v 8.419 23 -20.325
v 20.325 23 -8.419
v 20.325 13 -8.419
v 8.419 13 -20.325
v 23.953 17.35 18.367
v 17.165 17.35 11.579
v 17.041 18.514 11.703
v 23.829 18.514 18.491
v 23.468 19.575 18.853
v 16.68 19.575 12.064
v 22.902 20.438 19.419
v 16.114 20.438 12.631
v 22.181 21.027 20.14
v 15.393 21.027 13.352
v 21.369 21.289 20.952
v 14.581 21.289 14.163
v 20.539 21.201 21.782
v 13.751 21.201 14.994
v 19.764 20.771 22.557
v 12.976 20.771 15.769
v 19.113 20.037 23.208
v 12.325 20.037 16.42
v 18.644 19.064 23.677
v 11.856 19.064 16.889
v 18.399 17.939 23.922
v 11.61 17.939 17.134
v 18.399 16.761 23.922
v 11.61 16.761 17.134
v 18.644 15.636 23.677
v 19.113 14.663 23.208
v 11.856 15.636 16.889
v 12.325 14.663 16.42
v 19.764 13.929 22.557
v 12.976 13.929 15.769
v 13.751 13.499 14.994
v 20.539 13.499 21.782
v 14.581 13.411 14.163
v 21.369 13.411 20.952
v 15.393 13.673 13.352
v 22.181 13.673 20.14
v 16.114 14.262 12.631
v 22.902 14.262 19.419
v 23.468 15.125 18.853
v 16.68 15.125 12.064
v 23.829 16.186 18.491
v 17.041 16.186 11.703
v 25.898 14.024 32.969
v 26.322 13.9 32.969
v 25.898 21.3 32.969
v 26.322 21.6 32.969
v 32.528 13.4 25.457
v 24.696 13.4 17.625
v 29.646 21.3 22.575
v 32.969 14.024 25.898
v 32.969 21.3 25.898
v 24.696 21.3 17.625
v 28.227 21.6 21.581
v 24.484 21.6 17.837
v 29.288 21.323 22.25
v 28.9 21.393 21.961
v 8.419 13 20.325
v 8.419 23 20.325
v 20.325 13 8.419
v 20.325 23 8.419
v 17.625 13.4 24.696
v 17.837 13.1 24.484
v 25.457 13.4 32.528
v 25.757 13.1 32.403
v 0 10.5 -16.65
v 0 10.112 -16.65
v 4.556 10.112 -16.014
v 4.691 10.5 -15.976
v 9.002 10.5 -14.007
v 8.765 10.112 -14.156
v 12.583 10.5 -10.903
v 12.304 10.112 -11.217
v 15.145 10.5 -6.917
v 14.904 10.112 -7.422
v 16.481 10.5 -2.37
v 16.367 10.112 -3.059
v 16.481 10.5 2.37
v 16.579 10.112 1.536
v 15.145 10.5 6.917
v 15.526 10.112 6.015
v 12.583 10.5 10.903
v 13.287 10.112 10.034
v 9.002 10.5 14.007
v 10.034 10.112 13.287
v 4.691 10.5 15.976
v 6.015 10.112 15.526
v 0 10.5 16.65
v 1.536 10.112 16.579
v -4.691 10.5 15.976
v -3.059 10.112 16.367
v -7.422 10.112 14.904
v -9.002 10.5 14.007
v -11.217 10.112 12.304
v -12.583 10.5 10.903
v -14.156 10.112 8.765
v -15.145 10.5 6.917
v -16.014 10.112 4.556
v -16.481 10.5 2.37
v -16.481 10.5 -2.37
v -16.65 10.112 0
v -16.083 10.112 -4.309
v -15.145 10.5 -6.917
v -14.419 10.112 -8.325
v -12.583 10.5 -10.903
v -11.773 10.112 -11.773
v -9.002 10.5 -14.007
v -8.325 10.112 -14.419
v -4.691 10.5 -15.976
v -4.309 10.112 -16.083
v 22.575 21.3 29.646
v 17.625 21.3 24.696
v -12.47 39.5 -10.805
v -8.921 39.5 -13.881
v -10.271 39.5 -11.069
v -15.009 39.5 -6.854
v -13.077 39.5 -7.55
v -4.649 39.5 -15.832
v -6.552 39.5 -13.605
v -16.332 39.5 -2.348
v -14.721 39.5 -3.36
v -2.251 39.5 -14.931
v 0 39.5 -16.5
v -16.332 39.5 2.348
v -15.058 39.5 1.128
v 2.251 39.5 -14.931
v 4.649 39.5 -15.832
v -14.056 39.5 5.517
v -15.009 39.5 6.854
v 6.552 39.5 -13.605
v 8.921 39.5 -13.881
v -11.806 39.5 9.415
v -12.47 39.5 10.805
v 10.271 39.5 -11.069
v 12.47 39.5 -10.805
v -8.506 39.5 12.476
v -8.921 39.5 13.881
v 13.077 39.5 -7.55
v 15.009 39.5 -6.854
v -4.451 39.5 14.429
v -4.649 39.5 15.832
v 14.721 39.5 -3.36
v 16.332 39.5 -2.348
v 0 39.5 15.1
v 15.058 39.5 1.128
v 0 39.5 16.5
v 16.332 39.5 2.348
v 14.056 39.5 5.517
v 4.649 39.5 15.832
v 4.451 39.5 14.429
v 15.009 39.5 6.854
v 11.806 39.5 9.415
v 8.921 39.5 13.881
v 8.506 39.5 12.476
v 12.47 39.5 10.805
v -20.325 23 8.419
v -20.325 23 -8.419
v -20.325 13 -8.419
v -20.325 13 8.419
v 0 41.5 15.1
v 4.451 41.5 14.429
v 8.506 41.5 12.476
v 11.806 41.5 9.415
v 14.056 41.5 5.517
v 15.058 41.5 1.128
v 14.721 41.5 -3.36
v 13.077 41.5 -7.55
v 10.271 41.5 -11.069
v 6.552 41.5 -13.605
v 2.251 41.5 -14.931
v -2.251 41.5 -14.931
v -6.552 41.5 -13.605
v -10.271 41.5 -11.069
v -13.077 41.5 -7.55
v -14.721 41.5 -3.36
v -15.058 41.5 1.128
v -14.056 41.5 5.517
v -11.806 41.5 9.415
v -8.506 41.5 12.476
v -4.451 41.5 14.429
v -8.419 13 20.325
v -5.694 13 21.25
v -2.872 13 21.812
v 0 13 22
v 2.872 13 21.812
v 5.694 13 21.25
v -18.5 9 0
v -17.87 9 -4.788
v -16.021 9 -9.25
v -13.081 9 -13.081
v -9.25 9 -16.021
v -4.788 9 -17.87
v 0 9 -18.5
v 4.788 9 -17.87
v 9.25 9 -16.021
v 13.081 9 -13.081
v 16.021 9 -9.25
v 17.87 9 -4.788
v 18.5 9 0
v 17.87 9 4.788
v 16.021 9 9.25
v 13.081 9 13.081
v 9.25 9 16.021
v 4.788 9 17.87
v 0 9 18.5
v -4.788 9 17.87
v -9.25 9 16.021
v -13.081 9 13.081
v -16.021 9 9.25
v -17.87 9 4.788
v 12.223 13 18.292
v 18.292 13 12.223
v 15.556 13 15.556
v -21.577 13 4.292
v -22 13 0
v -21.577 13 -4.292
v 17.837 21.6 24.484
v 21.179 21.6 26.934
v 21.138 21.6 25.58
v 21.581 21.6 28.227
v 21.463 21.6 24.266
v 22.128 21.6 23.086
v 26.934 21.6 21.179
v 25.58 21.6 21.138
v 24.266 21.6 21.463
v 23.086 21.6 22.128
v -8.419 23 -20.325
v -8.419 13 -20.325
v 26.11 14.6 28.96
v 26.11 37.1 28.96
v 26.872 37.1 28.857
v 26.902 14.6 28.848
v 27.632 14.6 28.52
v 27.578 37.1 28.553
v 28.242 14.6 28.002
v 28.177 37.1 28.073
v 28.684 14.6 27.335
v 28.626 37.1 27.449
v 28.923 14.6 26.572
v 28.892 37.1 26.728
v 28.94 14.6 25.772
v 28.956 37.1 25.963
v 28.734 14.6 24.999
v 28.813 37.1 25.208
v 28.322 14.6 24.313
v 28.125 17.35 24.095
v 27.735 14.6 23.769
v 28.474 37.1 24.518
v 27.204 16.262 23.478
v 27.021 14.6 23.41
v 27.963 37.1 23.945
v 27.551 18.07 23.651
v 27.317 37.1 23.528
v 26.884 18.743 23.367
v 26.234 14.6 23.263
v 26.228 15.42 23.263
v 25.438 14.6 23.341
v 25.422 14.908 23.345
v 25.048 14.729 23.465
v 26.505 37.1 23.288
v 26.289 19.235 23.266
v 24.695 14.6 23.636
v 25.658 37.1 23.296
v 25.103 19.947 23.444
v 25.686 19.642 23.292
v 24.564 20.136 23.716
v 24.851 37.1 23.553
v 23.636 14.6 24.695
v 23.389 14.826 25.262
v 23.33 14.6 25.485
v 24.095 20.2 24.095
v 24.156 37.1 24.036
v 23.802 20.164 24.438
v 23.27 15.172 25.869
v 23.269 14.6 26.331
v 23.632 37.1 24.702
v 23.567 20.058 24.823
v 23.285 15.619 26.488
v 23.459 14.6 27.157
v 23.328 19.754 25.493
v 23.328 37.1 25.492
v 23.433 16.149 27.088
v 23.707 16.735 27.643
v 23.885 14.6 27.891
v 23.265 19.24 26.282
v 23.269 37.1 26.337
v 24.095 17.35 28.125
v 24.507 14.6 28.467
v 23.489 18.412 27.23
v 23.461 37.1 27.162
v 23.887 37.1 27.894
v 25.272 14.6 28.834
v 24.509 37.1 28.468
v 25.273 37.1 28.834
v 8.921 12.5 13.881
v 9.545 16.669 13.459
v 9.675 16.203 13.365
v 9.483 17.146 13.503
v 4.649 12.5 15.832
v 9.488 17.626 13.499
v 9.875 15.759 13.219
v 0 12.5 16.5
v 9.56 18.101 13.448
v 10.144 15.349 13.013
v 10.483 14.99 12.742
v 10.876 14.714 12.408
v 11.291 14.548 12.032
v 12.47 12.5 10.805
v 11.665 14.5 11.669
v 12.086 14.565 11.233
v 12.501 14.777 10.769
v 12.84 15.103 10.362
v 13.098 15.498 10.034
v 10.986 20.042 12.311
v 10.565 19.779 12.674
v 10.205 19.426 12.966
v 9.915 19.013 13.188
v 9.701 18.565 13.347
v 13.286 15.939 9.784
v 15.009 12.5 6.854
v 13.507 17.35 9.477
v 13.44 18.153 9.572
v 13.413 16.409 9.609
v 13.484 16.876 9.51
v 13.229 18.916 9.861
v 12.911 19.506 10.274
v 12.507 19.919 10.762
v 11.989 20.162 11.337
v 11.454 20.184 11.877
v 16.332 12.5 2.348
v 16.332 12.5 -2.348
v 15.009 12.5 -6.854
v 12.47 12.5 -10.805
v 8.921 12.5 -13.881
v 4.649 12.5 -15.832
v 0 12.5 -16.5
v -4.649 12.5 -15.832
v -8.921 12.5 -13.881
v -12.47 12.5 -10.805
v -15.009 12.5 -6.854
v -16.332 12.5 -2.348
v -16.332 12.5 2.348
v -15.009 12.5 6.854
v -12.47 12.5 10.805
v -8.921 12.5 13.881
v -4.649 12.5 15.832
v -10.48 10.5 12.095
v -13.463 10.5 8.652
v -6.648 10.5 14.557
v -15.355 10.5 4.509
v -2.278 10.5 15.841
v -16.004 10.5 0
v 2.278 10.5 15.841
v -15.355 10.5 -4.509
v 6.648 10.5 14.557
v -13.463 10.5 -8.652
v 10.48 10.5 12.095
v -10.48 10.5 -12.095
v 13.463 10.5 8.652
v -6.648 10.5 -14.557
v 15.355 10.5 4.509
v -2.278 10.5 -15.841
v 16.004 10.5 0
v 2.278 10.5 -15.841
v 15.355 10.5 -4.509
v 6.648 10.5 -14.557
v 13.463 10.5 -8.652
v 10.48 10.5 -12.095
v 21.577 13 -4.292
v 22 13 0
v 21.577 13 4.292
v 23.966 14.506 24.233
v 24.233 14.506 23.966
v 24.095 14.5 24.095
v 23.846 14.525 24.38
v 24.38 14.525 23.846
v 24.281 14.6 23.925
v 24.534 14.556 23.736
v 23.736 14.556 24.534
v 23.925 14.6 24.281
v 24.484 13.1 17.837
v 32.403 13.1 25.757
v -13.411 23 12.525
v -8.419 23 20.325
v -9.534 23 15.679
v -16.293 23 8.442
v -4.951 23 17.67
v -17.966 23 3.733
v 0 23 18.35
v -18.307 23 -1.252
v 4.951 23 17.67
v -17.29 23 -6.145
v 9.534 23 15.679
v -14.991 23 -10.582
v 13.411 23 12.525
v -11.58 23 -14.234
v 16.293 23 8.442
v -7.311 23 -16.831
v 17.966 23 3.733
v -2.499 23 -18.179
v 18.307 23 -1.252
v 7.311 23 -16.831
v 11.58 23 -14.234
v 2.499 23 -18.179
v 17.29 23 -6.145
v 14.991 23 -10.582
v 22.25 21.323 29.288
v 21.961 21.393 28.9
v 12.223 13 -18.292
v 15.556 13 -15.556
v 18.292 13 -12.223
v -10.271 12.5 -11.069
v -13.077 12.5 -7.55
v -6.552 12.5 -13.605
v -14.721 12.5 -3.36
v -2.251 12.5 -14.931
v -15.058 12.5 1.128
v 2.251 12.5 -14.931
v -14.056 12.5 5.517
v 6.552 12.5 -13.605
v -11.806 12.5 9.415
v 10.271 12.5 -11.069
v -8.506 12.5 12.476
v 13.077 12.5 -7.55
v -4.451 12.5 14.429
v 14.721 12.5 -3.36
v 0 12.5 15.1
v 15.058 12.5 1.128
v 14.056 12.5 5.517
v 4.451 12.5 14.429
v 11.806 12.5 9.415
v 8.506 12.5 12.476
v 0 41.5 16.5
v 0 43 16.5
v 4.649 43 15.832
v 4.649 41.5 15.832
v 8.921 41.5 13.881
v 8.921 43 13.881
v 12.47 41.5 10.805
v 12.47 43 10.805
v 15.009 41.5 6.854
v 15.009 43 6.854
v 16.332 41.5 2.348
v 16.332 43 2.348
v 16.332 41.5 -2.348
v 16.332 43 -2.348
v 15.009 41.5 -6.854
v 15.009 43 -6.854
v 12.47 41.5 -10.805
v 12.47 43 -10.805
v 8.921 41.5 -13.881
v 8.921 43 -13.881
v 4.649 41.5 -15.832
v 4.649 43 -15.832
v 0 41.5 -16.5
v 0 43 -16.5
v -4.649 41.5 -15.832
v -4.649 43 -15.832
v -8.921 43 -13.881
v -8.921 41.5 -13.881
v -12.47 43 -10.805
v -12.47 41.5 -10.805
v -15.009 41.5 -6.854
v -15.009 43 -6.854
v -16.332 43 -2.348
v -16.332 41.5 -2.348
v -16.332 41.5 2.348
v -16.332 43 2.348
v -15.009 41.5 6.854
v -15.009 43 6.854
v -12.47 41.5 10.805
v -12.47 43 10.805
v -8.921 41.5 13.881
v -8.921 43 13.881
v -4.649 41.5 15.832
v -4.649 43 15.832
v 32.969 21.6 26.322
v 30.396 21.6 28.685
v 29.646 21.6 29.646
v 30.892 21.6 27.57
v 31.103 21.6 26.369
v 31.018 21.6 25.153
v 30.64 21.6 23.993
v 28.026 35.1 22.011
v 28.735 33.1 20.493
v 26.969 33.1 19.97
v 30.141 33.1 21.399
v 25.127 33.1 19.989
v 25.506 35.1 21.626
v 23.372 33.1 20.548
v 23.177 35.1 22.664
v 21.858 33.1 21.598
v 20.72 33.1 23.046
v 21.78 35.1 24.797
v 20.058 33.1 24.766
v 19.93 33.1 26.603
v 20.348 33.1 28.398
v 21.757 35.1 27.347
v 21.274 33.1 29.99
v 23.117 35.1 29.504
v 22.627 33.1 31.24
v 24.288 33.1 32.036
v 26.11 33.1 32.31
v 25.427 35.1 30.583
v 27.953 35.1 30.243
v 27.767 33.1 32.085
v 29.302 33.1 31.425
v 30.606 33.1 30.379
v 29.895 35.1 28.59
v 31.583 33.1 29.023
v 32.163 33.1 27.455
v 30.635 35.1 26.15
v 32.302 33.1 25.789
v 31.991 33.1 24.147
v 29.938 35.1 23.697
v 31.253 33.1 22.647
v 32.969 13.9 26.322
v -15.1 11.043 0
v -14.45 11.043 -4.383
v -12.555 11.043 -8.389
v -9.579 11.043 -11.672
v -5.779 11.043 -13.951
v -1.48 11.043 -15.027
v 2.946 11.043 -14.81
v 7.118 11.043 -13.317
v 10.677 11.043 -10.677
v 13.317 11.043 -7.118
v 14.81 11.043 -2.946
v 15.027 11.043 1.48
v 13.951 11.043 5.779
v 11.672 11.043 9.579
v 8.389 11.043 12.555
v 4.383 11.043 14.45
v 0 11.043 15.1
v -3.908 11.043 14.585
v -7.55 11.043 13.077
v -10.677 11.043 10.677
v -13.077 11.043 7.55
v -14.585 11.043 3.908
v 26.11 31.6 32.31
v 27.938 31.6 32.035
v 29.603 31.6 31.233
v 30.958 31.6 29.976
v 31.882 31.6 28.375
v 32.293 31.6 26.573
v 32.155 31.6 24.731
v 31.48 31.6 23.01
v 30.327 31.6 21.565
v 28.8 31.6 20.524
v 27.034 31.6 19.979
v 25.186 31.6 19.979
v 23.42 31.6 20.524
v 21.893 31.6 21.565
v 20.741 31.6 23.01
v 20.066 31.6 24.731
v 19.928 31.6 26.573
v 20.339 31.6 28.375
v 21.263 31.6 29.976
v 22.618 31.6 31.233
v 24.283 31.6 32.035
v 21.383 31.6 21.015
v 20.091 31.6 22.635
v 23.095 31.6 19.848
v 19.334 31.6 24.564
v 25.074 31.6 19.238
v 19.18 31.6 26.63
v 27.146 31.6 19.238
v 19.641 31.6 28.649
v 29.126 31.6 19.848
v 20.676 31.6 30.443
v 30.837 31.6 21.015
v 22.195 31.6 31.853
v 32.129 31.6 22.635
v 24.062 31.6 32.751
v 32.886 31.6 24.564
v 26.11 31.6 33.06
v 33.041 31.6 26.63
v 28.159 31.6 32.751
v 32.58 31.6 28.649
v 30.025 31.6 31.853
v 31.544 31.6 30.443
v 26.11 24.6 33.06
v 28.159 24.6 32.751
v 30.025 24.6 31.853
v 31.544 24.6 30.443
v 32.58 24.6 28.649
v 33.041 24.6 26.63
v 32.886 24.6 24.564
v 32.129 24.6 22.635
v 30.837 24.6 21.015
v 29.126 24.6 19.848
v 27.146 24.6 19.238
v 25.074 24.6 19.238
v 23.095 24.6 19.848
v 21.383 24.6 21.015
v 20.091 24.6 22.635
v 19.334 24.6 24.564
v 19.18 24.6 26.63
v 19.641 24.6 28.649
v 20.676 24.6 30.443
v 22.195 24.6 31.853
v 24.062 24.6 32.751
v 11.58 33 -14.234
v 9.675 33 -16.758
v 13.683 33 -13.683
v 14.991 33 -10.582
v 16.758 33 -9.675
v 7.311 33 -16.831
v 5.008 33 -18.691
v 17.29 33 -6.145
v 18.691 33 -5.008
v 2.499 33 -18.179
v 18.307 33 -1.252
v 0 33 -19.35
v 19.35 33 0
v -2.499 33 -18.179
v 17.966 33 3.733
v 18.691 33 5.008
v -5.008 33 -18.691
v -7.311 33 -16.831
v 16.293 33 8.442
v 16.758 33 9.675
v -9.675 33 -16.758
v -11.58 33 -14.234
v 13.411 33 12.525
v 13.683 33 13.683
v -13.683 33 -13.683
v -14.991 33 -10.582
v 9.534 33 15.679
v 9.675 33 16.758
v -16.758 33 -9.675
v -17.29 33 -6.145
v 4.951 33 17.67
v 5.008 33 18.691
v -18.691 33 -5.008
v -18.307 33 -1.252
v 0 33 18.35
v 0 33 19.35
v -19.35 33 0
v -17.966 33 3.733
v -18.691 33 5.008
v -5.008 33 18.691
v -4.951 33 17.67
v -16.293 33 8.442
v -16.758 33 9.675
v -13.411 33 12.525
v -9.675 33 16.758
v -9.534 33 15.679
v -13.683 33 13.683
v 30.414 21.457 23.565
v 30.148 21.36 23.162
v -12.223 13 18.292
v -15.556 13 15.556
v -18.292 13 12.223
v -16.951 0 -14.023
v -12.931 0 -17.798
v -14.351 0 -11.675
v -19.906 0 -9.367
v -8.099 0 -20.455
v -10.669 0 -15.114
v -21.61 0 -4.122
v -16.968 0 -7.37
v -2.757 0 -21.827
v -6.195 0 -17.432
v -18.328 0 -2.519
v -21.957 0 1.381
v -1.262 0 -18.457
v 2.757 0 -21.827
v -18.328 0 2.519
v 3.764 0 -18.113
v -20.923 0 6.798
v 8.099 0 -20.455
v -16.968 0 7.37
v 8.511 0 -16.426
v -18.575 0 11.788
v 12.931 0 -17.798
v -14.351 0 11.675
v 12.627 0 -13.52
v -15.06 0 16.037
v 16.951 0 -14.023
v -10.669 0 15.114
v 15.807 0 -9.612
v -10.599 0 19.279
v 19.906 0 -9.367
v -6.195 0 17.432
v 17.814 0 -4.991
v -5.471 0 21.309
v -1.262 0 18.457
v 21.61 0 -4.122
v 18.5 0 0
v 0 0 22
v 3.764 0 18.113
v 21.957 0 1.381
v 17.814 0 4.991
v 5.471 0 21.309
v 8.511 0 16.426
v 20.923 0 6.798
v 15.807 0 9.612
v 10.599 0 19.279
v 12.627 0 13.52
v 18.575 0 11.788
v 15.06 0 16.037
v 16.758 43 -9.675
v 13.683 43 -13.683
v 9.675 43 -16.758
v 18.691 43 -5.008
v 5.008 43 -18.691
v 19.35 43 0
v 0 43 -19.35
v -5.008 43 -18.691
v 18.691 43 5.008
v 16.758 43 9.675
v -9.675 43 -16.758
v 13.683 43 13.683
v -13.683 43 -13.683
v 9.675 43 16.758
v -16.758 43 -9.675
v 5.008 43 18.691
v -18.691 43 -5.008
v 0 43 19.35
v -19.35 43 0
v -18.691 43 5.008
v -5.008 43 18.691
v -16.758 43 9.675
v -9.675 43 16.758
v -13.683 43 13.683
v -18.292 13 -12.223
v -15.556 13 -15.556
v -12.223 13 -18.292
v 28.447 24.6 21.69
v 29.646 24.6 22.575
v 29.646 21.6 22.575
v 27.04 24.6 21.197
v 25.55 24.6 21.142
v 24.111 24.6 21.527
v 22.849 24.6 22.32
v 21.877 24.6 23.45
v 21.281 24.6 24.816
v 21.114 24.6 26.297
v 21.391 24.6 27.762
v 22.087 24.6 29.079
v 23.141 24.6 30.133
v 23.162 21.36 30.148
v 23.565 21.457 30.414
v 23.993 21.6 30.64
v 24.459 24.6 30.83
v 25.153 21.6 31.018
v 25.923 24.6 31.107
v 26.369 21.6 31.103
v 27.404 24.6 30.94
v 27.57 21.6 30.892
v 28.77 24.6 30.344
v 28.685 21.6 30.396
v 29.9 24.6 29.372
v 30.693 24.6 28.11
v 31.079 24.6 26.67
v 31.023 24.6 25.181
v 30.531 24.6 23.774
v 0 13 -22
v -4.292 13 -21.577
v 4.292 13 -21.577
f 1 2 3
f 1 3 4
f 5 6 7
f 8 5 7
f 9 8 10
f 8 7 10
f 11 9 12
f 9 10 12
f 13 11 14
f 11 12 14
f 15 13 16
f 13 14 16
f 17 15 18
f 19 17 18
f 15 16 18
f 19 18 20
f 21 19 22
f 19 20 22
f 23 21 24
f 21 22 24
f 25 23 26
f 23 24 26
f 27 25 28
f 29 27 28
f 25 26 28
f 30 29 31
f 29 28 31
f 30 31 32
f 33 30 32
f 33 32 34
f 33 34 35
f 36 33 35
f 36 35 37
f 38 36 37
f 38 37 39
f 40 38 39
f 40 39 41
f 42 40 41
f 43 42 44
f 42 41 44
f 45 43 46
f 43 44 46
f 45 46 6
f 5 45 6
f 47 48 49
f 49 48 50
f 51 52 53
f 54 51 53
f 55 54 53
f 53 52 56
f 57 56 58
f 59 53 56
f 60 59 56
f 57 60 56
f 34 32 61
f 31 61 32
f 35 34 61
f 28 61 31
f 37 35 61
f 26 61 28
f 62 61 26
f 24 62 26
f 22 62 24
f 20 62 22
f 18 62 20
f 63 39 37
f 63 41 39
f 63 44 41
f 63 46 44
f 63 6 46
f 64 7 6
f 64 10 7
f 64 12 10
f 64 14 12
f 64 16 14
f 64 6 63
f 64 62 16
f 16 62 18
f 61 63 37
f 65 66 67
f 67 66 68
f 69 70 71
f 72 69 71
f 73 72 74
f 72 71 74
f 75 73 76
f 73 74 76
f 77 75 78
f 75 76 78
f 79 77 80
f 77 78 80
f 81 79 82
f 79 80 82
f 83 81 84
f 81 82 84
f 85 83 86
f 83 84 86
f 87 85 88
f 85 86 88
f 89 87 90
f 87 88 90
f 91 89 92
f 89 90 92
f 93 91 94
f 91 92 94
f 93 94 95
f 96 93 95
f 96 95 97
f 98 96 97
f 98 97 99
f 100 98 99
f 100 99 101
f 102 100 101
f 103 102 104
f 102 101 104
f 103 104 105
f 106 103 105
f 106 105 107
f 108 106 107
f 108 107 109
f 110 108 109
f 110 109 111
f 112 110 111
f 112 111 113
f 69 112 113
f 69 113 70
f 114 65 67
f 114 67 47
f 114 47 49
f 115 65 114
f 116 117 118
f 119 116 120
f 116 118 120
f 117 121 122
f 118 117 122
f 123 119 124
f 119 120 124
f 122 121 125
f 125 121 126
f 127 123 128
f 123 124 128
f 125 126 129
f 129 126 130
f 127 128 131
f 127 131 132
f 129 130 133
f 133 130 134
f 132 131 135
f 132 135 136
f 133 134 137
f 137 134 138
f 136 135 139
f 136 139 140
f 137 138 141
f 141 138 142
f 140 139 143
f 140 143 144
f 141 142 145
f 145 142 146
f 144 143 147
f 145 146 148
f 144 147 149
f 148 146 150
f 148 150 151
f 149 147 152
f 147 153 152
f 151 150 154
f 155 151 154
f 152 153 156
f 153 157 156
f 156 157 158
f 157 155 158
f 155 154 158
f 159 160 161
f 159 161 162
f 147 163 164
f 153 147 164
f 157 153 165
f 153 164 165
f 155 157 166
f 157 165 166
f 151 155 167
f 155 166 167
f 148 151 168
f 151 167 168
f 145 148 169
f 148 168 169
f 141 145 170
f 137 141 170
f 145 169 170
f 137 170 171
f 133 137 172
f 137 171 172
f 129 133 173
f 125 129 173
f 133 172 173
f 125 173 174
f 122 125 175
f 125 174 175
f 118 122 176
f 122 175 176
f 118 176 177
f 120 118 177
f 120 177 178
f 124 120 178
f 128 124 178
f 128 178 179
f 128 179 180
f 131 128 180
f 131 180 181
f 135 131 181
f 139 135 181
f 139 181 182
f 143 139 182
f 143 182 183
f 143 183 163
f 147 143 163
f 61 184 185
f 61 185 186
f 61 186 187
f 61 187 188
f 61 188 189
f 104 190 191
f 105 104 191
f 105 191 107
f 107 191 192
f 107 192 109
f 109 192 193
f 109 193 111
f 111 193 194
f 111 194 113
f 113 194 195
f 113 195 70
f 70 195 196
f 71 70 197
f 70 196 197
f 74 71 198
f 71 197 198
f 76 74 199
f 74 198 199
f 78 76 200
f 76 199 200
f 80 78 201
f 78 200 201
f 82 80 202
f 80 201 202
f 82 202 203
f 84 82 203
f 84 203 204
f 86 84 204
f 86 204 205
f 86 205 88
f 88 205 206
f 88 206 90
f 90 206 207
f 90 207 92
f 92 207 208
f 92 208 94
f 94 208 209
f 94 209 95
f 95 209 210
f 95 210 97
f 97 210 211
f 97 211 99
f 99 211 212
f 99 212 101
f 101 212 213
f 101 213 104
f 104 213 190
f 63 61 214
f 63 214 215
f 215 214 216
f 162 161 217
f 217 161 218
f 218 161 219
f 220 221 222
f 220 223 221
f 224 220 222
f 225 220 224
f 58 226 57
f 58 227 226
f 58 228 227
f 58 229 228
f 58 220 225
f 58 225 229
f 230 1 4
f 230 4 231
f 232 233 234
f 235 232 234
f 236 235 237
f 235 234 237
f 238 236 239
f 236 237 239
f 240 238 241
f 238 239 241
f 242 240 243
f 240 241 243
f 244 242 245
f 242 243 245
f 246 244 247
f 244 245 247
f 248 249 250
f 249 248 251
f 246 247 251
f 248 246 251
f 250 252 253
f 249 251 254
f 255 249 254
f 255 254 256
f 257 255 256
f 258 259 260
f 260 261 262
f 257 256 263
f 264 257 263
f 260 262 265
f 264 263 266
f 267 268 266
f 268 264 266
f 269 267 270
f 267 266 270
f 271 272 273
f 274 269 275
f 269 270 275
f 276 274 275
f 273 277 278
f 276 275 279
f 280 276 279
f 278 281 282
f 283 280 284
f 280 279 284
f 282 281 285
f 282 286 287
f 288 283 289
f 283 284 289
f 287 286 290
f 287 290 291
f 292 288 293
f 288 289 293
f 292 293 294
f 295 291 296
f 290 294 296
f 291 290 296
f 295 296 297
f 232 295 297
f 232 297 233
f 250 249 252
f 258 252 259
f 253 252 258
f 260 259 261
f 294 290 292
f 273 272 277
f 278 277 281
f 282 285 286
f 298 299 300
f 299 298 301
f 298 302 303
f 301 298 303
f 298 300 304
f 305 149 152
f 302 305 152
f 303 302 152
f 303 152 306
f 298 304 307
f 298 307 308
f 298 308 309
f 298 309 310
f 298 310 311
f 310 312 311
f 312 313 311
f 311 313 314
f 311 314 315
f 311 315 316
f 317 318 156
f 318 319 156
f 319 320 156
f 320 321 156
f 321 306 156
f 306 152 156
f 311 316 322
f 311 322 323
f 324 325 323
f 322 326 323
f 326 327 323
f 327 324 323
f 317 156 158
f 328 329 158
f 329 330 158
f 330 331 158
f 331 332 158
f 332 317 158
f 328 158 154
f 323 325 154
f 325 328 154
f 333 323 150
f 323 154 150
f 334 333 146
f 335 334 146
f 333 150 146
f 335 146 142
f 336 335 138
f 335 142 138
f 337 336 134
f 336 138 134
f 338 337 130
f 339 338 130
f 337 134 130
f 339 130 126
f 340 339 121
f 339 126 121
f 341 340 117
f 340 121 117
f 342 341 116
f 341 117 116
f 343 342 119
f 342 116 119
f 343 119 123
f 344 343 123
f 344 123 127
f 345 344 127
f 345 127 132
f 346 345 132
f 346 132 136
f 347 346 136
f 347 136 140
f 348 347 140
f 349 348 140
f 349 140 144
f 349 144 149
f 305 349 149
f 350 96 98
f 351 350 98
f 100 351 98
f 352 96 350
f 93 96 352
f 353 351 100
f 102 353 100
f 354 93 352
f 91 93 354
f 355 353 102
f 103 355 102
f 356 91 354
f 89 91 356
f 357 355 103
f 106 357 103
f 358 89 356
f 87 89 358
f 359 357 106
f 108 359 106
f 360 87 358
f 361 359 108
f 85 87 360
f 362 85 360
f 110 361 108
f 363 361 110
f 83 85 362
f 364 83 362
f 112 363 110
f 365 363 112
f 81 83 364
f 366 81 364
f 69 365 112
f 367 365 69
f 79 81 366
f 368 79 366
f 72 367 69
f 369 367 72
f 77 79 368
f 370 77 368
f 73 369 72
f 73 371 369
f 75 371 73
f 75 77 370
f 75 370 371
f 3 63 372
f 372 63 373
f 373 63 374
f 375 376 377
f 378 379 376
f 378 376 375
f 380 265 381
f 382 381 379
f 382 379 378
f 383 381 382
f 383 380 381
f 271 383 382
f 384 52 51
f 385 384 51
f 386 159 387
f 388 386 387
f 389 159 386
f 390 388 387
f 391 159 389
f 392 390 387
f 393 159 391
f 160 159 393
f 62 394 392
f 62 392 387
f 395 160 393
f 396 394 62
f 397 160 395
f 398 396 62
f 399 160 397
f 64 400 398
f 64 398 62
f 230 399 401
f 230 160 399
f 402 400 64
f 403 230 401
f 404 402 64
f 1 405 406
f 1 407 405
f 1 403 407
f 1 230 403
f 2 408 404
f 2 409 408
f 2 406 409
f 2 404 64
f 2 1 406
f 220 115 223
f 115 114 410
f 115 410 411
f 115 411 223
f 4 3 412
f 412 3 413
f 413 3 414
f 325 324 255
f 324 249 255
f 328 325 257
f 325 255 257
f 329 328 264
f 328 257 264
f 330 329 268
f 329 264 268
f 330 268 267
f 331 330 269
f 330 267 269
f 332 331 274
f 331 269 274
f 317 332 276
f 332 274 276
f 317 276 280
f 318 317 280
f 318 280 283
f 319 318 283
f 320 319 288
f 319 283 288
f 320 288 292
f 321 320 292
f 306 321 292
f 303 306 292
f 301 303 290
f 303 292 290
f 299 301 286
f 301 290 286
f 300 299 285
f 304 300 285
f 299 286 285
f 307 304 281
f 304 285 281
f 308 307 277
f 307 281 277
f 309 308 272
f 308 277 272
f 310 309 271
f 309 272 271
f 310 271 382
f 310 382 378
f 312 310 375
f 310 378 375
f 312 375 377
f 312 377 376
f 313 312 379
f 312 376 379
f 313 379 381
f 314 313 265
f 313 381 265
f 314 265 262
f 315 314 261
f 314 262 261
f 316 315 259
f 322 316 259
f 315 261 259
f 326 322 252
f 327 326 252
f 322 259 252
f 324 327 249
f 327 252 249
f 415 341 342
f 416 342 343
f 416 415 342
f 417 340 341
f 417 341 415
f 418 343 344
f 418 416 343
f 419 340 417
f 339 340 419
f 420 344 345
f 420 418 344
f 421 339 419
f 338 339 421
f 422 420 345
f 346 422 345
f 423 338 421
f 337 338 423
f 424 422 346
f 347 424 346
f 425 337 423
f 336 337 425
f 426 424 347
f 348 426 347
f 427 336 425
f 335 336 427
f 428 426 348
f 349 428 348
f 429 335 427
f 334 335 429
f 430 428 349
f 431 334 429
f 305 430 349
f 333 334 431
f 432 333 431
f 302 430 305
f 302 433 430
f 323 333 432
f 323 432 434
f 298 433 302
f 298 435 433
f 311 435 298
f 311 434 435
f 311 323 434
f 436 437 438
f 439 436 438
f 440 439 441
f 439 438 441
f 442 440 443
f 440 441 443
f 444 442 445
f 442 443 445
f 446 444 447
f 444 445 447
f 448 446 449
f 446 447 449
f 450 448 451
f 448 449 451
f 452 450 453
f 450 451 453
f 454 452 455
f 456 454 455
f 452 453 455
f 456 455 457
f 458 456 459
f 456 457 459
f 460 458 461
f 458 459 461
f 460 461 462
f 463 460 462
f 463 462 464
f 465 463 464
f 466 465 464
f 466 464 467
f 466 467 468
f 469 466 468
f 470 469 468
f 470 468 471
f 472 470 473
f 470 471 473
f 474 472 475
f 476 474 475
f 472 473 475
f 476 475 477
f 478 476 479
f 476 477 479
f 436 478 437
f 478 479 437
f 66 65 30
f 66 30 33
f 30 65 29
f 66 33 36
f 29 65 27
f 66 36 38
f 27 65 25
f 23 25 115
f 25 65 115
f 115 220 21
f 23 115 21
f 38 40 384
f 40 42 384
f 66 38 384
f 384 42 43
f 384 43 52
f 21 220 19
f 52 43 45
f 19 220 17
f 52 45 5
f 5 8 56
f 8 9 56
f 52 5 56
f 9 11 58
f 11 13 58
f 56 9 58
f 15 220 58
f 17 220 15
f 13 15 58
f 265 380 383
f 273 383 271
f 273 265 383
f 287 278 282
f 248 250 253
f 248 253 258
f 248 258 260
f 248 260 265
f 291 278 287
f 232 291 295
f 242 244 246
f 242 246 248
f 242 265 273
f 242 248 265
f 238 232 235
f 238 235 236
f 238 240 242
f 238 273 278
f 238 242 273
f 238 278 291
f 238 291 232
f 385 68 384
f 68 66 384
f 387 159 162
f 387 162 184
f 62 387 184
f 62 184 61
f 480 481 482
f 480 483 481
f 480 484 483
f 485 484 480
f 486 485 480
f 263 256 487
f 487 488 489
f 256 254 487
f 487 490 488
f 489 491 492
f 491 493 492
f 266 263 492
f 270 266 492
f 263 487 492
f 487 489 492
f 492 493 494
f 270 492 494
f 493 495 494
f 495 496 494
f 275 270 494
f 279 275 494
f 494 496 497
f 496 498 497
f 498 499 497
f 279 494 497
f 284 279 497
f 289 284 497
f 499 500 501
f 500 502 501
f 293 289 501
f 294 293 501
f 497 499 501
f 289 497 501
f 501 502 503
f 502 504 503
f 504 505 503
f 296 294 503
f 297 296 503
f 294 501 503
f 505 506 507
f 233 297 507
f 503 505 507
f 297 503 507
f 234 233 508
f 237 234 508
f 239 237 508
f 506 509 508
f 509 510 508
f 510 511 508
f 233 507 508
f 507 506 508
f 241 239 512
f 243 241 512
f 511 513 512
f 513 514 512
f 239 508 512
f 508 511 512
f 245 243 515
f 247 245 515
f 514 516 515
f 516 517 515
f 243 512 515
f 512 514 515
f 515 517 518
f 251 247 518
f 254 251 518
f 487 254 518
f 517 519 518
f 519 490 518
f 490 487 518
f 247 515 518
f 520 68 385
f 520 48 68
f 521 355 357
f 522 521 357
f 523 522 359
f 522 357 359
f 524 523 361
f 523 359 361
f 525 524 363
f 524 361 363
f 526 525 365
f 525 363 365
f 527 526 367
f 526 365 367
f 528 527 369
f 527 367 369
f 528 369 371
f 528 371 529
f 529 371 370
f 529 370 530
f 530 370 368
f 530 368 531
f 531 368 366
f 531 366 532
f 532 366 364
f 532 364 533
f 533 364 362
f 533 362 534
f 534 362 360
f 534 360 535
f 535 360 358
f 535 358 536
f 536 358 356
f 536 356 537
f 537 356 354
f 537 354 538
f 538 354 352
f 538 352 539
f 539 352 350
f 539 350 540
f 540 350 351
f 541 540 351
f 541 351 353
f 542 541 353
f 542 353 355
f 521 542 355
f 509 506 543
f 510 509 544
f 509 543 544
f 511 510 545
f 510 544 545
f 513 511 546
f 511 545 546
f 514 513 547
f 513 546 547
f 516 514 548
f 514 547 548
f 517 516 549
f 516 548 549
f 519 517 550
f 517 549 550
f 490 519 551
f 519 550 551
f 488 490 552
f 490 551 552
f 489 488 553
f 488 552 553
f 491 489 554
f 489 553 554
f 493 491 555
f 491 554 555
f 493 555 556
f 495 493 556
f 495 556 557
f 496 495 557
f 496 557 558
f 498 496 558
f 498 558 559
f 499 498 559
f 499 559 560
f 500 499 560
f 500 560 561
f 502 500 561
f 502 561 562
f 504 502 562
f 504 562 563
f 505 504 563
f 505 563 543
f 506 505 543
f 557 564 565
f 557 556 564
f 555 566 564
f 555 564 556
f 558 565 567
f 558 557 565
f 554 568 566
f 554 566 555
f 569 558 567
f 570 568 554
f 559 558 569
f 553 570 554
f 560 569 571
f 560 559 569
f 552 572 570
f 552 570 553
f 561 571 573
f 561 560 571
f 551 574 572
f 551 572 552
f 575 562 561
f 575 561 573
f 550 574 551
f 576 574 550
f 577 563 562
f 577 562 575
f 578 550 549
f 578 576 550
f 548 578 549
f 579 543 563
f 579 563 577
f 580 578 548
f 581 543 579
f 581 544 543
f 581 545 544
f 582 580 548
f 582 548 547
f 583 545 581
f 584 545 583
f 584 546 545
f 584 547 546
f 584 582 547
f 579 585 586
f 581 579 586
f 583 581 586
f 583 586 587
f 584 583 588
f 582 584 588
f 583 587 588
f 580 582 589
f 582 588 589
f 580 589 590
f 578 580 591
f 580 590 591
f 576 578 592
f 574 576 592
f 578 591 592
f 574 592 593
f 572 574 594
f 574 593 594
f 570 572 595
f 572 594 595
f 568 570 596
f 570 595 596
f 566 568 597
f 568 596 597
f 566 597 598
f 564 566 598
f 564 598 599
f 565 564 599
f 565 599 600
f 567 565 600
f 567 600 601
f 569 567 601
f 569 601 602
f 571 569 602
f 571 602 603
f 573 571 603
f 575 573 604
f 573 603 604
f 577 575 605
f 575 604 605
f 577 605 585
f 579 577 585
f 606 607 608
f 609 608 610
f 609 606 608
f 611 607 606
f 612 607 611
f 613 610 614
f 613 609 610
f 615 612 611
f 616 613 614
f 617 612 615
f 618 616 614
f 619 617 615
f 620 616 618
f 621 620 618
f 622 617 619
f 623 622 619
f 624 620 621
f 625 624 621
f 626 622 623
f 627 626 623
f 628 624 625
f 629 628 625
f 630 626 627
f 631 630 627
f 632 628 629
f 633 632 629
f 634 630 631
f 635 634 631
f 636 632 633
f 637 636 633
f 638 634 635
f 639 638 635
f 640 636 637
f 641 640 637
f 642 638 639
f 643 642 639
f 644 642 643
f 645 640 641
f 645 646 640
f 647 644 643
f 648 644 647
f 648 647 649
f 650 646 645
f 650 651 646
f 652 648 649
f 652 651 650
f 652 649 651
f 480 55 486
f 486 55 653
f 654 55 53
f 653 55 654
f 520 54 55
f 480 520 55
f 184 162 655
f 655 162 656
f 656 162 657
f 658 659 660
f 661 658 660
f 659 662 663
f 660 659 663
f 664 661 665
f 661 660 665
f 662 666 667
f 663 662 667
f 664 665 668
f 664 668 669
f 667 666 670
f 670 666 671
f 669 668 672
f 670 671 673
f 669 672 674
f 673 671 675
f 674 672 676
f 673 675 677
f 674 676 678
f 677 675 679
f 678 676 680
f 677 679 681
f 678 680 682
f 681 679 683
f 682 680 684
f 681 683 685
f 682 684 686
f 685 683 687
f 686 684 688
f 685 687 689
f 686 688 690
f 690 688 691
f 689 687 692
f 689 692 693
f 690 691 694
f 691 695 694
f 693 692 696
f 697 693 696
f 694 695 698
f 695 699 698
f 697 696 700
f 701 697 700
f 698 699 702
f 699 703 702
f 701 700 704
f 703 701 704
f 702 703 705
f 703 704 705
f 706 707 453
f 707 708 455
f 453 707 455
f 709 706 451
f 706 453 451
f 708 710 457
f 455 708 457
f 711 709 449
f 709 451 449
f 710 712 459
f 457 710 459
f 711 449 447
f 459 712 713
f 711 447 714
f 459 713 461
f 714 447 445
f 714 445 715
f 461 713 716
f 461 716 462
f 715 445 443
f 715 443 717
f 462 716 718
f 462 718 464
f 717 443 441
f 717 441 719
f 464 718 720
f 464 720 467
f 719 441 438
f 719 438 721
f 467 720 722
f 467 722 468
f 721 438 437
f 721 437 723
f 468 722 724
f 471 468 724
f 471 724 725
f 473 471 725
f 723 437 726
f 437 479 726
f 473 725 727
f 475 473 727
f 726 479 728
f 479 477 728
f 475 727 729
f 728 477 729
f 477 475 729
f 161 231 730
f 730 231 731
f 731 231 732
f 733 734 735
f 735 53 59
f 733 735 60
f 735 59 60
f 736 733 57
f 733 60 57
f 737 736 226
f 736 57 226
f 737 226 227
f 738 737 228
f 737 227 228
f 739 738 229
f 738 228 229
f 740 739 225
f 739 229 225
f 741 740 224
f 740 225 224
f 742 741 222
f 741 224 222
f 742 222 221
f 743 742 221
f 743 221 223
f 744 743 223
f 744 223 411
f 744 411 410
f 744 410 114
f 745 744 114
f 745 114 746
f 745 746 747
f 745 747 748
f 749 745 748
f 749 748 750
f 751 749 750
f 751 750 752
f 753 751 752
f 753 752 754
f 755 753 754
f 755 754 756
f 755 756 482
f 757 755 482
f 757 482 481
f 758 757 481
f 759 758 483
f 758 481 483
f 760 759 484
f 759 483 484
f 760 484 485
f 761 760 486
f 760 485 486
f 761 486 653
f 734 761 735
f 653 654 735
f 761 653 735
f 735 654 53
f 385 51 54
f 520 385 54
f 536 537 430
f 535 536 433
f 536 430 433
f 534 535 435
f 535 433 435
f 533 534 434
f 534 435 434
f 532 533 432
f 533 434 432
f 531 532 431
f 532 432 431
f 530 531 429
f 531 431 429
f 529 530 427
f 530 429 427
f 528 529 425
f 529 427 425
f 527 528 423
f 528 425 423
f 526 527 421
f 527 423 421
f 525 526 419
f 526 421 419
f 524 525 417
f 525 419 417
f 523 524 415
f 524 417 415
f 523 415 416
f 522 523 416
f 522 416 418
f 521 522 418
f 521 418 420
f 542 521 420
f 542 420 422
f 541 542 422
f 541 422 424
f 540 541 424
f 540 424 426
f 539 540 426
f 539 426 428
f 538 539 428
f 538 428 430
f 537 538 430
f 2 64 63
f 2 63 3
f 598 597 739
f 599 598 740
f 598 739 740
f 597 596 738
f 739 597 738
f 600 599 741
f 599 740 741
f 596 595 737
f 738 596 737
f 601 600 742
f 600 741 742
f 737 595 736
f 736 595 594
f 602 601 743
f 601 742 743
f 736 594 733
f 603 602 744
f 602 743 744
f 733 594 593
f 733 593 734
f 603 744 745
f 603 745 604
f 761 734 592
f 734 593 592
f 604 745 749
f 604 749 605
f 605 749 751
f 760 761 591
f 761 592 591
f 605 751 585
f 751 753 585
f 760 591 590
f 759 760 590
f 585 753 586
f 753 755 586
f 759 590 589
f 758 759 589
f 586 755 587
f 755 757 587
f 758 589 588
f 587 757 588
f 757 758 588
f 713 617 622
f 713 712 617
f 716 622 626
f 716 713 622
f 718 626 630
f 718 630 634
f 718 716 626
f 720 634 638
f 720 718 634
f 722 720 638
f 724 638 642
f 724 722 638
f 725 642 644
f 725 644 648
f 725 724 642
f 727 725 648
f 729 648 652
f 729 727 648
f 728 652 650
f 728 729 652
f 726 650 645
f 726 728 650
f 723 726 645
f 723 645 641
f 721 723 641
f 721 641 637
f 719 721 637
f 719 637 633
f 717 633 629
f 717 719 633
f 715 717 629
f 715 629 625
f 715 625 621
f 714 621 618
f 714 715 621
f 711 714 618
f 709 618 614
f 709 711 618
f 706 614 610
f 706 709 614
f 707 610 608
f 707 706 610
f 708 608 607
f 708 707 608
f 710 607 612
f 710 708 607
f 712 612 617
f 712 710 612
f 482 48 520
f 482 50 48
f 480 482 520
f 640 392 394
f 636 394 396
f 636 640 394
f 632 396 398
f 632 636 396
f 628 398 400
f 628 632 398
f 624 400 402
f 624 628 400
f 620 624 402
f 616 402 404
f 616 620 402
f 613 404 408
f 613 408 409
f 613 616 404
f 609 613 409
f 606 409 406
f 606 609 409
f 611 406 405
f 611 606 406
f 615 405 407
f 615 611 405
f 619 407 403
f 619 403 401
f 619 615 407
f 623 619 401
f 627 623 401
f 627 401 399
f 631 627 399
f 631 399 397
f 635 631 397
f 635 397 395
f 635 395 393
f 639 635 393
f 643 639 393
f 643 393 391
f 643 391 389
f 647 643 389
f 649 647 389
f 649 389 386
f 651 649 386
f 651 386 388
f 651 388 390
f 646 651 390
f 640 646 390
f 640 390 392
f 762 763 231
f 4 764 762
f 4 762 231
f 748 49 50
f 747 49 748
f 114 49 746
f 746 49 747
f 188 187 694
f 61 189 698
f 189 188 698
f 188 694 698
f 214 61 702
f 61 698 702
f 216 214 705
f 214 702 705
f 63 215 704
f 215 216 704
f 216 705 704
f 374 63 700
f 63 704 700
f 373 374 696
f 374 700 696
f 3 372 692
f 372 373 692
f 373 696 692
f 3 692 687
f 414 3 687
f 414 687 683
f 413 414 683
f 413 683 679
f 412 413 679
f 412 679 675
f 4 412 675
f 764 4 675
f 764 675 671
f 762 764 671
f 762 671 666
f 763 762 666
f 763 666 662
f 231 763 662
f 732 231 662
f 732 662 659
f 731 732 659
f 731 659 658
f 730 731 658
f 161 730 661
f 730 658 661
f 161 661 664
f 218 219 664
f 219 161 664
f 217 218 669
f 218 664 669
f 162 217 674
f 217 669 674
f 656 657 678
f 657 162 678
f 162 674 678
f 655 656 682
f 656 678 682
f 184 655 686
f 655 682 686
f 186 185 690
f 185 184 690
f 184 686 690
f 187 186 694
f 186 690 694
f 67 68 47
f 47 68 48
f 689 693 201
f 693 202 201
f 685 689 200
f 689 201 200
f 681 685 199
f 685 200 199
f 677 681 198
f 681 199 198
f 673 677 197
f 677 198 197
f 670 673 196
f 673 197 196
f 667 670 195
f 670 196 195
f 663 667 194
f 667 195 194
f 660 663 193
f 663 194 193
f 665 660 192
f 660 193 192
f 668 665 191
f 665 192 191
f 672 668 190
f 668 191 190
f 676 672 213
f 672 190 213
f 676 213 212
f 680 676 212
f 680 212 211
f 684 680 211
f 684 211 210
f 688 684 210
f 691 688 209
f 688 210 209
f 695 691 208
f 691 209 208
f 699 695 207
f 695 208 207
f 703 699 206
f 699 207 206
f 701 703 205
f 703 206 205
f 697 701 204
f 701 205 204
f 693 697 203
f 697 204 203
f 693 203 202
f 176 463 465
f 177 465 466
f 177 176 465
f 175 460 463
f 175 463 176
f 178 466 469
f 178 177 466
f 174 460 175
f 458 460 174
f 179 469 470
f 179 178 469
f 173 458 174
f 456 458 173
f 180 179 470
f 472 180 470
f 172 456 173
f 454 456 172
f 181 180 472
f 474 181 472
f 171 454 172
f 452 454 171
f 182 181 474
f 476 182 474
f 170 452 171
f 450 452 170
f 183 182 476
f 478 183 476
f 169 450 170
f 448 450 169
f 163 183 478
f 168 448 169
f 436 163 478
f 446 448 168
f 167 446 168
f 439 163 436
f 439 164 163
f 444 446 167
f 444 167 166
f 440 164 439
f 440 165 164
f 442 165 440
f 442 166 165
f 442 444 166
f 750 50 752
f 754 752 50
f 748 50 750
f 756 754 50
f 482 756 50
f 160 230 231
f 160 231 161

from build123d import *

# Parameters (mm, degrees)
SKETCH_1_R                = 22
EXTRUDE_1_DEPTH           = 43
SKETCH_3_OUTSIDE_W        = 61.128
SKETCH_3_OUTSIDE_H        = 61.128
CUT_EXTRUDE_1_DEPTH       = 30
SKETCH_4_OUTSIDE_W        = 61.128
SKETCH_4_OUTSIDE_H        = 61.128
SKETCH_4_OUTSIDE_R        = 18.35
CUT_EXTRUDE_2_DEPTH       = 20
SKETCH_5_R                = 16.5
CUT_EXTRUDE_3_DEPTH       = 1.5
SKETCH_6_R                = 15.1
CUT_EXTRUDE_4_DEPTH       = 54.075418039
SKETCH_7_R                = 16.5
CUT_EXTRUDE_5_DEPTH       = 27
SKETCH_8_R                = 16.65
CUT_EXTRUDE_6_DEPTH       = 10.5
M39X2_02_D                = 37
M39X2_02_DEPTH            = 9
M39X2_02_TIP              = 11.115921452
SKETCH_14_R               = 3.95
EXTRUDE_2_DEPTH           = 9.6
SKETCH_15_W               = 10
SKETCH_15_H               = 8.5
EXTRUDE_3_DEPTH           = 12
CHAMFER_1_SIZE            = 0.8
CHAMFER_2_SIZE            = 0.3
SKETCH_18_R               = 5
EXTRUDE_4_DEPTH           = 3
CHAMFER_3_SIZE            = 0.3
SKETCH_19_R               = 6.95
EXTRUDE_5_DEPTH           = 7
SKETCH_21_R               = 6.2
EXTRUDE_6_DEPTH           = 1.5
SKETCH_24_R               = 2.85
CUT_EXTRUDE_7_DEPTH       = 22.5
CUT_EXTRUDE_11_REACH      = 69.044
CUT_EXTRUDE_11_END_RADIUS = 2.85
SKETCH_25_R               = 2.85
CUT_EXTRUDE_12_REACH      = 69.044
SKETCH_26_R               = 2.85
SKETCH_27_W               = 1
SKETCH_27_H               = 10


with BuildPart() as part:
    # Эскиз1 → Бобышка-Вытянуть1 (new body)
    with BuildSketch(Plane(origin=(0, 0, 0), x_dir=(1, 0, 0), z_dir=(0, 1, 0))):
        with Locations(Location((0, 0, 0), (0, 0, 270))):
            Circle(SKETCH_1_R)
    extrude(amount=EXTRUDE_1_DEPTH)

    # Эскиз3 outside → Вырез-Вытянуть1 (cut)
    with BuildSketch(Plane(origin=(0, 43, 0), x_dir=(1, 0, 0), z_dir=(0, 1, 0))):
        Rectangle(SKETCH_3_OUTSIDE_W, SKETCH_3_OUTSIDE_H)
        Polygon((20.325349715, -8.419035512), (20.325349715, 8.419035512), (8.419035512, 20.325349715), (-8.419035512, 20.325349715), (-20.325349715, 8.419035512), (-20.325349715, -8.419035512), (-8.419035512, -20.325349715), (8.419035512, -20.325349715), align=None, mode=Mode.SUBTRACT)
    extrude(amount=-CUT_EXTRUDE_1_DEPTH, mode=Mode.SUBTRACT)

    # Эскиз4 outside → Вырез-Вытянуть2 (cut)
    with BuildSketch(Plane(origin=(0, 43, 0), x_dir=(1, 0, 0), z_dir=(0, 1, 0))):
        Rectangle(SKETCH_4_OUTSIDE_W, SKETCH_4_OUTSIDE_H)
        with Locations(Location((0, 0, 0), (0, 0, 270))):
            Circle(SKETCH_4_OUTSIDE_R, mode=Mode.SUBTRACT)
    extrude(amount=-CUT_EXTRUDE_2_DEPTH, mode=Mode.SUBTRACT)

    # Эскиз5 → Вырез-Вытянуть3 (cut)
    with BuildSketch(Plane(origin=(0, 43, 0), x_dir=(1, 0, 0), z_dir=(0, 1, 0))):
        with Locations(Location((0, 0, 0), (0, 0, 270))):
            Circle(SKETCH_5_R)
    extrude(amount=-CUT_EXTRUDE_3_DEPTH, mode=Mode.SUBTRACT)

    # Эскиз6 → Вырез-Вытянуть4 (cut, through all)
    with BuildSketch(Plane(origin=(0, 43, 0), x_dir=(1, 0, 0), z_dir=(0, 1, 0))):
        with Locations(Location((0, 0, 0), (0, 0, 270))):
            Circle(SKETCH_6_R)
    extrude(amount=-CUT_EXTRUDE_4_DEPTH, mode=Mode.SUBTRACT)

    # Эскиз7 → Вырез-Вытянуть5 (cut)
    with BuildSketch(Plane(origin=(0, 39.5, 0), x_dir=(1, 0, 0), z_dir=(0, 1, 0))):
        with Locations(Location((0, 0, 0), (0, 0, 270))):
            Circle(SKETCH_7_R)
    extrude(amount=-CUT_EXTRUDE_5_DEPTH, mode=Mode.SUBTRACT)

    # Эскиз8 → Вырез-Вытянуть6 (cut)
    with BuildSketch(Plane.XZ):
        with Locations(Location((0, 0, 0), (0, 0, 270))):
            Circle(SKETCH_8_R)
    extrude(amount=-CUT_EXTRUDE_6_DEPTH, mode=Mode.SUBTRACT)

    # Отверстие обработанное метчиком M39x2.02
    with Locations(Plane(origin=(0, 0, 0), x_dir=(-1, 0, 0), z_dir=(0, -1, 0))):
        with Locations((0, 0)):
            Hole(M39X2_02_D / 2, depth=M39X2_02_DEPTH)
            with Locations((0, 0, -(M39X2_02_DEPTH + M39X2_02_TIP / 2))):  # 118° drill point
                Cone(0, M39X2_02_D / 2, M39X2_02_TIP, mode=Mode.SUBTRACT)

    # Эскиз14 → Бобышка-Вытянуть2 (add)
    with BuildSketch(Plane(origin=(14.372192614, 0, 14.372192614), x_dir=(0.7071067811865475, 0, -0.7071067811865476), z_dir=(0.7071067811865476, 0, 0.7071067811865475))):
        with Locations((0, 17.35)):
            Circle(SKETCH_14_R)
    extrude(amount=EXTRUDE_2_DEPTH)

    # Эскиз15 → Бобышка-Вытянуть3 (add)
    with BuildSketch(Plane(origin=(21.160417713, 0, 21.160417713), x_dir=(0.7071067811865475, 0, -0.7071067811865476), z_dir=(0.7071067811865476, 0, 0.7071067811865475))):
        with Locations((0, 17.35)):
            Rectangle(SKETCH_15_W, SKETCH_15_H)
    extrude(amount=EXTRUDE_3_DEPTH)

    # Фаска1
    chamfer_1_edges = [part.edges().sort_by_distance(p)[0] for p in [
        (29.645699087, 13.1, 29.645699087),
    ]]
    chamfer(chamfer_1_edges, length=CHAMFER_1_SIZE)

    # Фаска2
    chamfer_2_edges = [part.edges().sort_by_distance(p)[0] for p in [
        (26.110165181, 17.75, 33.181232993),
        (33.181232993, 17.75, 26.110165181),
        (28.655749594, 13.1, 21.584681782),
        (32.898390281, 13.5, 25.827322469),
        (21.584681782, 13.1, 28.655749594),
        (25.827322469, 13.5, 32.898390281),
    ]]
    chamfer(chamfer_2_edges, length=CHAMFER_2_SIZE)

    # Эскиз18 → Бобышка-Вытянуть4 (add)
    with BuildSketch(Plane(origin=(0, 21.6, 0), x_dir=(1, 0, 0), z_dir=(0, 1, 0))):
        with Locations(Location((26.110165181, -26.110165181, 0), (0, 0, 45))):
            Circle(SKETCH_18_R)
    extrude(amount=EXTRUDE_4_DEPTH)

    # Фаска3
    # the kernel refuses this chamfer: 0.3 mm, written as the material it takes off along each edge
    with BuildSketch(Plane(origin=(24.150415275, 21.6, 17.079347463), x_dir=(0.01944252080601493, -0.9996219169112965, -0.019442520806014937), z_dir=(0.7071067811865476, 0, 0.7071067811865475))) as chamfer_3_piece_1_section:
        Polygon((CHAMFER_3_SIZE * 0.999621916911, -CHAMFER_3_SIZE * 0.0274958766106), (-CHAMFER_3_SIZE * 0.0274958766106, -CHAMFER_3_SIZE * 0.999621916911), (0, 0), align=None)
    chamfer_3_piece_1 = extrude(amount=7.771504896, mode=Mode.PRIVATE)
    chamfer_3_piece_1 = chamfer_3_piece_1 - Plane(origin=(26.110165181, 21.497863029, 26.110165181), x_dir=(0.7071067811865476, 0, -0.7071067811865475), z_dir=(0, -1, 0)) * Cylinder(5, 17, mode=Mode.PRIVATE)
    add(chamfer_3_piece_1, mode=Mode.SUBTRACT)
    with BuildSketch(Plane(origin=(29.645699087, 21.6, 22.574631275), x_dir=(0.01944252080600918, -0.999621916911297, -0.019442520806009188), z_dir=(0.7071067811865476, 0, 0.7071067811865475))) as chamfer_3_piece_2_section:
        Polygon((CHAMFER_3_SIZE * 0.999621916911, -CHAMFER_3_SIZE * 0.0274958766106), (-CHAMFER_3_SIZE * 0.0274958766106, -CHAMFER_3_SIZE * 0.999621916911), (0, 0), align=None)
    chamfer_3_piece_2 = extrude(amount=5.471504896, mode=Mode.PRIVATE)
    chamfer_3_piece_2 = chamfer_3_piece_2 - Plane(origin=(26.110165181, 21.497295997, 26.110165181), x_dir=(0.7071067811865476, 0, -0.7071067811865475), z_dir=(0, -1, 0)) * Cylinder(5, 13, mode=Mode.PRIVATE)
    add(chamfer_3_piece_2, mode=Mode.SUBTRACT)
    with BuildSketch(Plane(origin=(17.079347463, 21.6, 24.150415275), x_dir=(-0.01944252080601493, -0.9996219169112965, 0.019442520806014937), z_dir=(0.7071067811865476, 0, 0.7071067811865475))) as chamfer_3_piece_3_section:
        Polygon((CHAMFER_3_SIZE * 0.999621916911, CHAMFER_3_SIZE * 0.0274958766106), (-CHAMFER_3_SIZE * 0.0274958766106, CHAMFER_3_SIZE * 0.999621916911), (0, 0), align=None)
    chamfer_3_piece_3 = extrude(amount=7.771504896, mode=Mode.PRIVATE)
    chamfer_3_piece_3 = chamfer_3_piece_3 - Plane(origin=(26.110165181, 21.497863029, 26.110165181), x_dir=(0.7071067811865476, 0, -0.7071067811865475), z_dir=(0, -1, 0)) * Cylinder(5, 17, mode=Mode.PRIVATE)
    add(chamfer_3_piece_3, mode=Mode.SUBTRACT)
    with BuildSketch(Plane(origin=(22.574631275, 21.6, 29.645699087), x_dir=(-0.01944252080602069, -0.9996219169112965, 0.01944252080602069), z_dir=(0.7071067811865476, 0, 0.7071067811865475))) as chamfer_3_piece_4_section:
        Polygon((CHAMFER_3_SIZE * 0.999621916911, CHAMFER_3_SIZE * 0.0274958766106), (-CHAMFER_3_SIZE * 0.0274958766106, CHAMFER_3_SIZE * 0.999621916911), (0, 0), align=None)
    chamfer_3_piece_4 = extrude(amount=5.471504896, mode=Mode.PRIVATE)
    chamfer_3_piece_4 = chamfer_3_piece_4 - Plane(origin=(26.110165181, 21.497295996, 26.110165181), x_dir=(0.7071067811865476, 0, -0.7071067811865475), z_dir=(0, -1, 0)) * Cylinder(5, 13, mode=Mode.PRIVATE)
    add(chamfer_3_piece_4, mode=Mode.SUBTRACT)

    # Эскиз19 → Бобышка-Вытянуть5 (add)
    with BuildSketch(Plane(origin=(0, 24.6, 0), x_dir=(1, 0, 0), z_dir=(0, 1, 0))):
        with Locations(Location((26.110165181, -26.110165181, 0), (0, 0, 270))):
            Circle(SKETCH_19_R)
    extrude(amount=EXTRUDE_5_DEPTH)

    # Эскиз21 → Бобышка-Вытянуть6 (add)
    with BuildSketch(Plane(origin=(0, 31.6, 0), x_dir=(1, 0, 0), z_dir=(0, 1, 0))):
        with Locations(Location((26.110165181, -26.110165181, 0), (0, 0, 270))):
            Circle(SKETCH_21_R)
    extrude(amount=EXTRUDE_6_DEPTH)

    # Эскиз22 → Повернуть1 (revolve)
    with BuildSketch(Plane(origin=(0, 0, 0), x_dir=(0.7071067811865477, 0, 0.7071067811865475), z_dir=(-0.7071067811865475, 0, 0.7071067811865477)), mode=Mode.PRIVATE) as revolve_1_sk:
        Polygon((36.925349715, 33.1), (36.925349715, 37.1), (39.775349715, 37.1), (43.125349715, 33.1), align=None)
    revolve(revolve_1_sk.sketch.rotate(Axis((26.110165181, -966.9, 26.110165181), (0, 1, 0)), 109.948443589), axis=Axis((26.110165181, -966.9, 26.110165181), (0, 1, 0)))

    # Эскиз24 → Вырез-Вытянуть7 (cut)
    with BuildSketch(Plane(origin=(0, 37.1, 0), x_dir=(1, 0, 0), z_dir=(0, 1, 0))):
        with Locations(Location((26.110165181, -26.110165181, 0), (0, 0, 270))):
            Circle(SKETCH_24_R)
    extrude(amount=-CUT_EXTRUDE_7_DEPTH, mode=Mode.SUBTRACT)

    # Вырез-Вытянуть11: up to this cylinder (the profile starts outside it)
    cut_extrude_11_end = Plane(origin=(26.110165181, 17.35, 26.110165181), z_dir=(0, 1, 0)) * Cylinder(CUT_EXTRUDE_11_END_RADIUS, 144.788, mode=Mode.PRIVATE)
    # Эскиз25 → Вырез-Вытянуть11 (cut, up to the surface)
    with BuildSketch(Plane(origin=(14.372192614, 0, 14.372192614), x_dir=(0.7071067811865475, 0, -0.7071067811865476), z_dir=(0.7071067811865476, 0, 0.7071067811865475)), mode=Mode.PRIVATE) as cut_extrude_11_sk1:
        with Locations((0, 17.35)):
            Circle(SKETCH_25_R)
    cut_extrude_11_tool1 = extrude(cut_extrude_11_sk1.sketch, amount=CUT_EXTRUDE_11_REACH, mode=Mode.PRIVATE) - cut_extrude_11_end
    add(cut_extrude_11_tool1.solids().sort_by_distance((14.372193, 17.35, 14.372193))[0], mode=Mode.SUBTRACT)

    # Эскиз26 → Вырез-Вытянуть12 (cut, up to next)
    with BuildSketch(Plane(origin=(14.372192614, 0, 14.372192614), x_dir=(0.7071067811865475, 0, -0.7071067811865476), z_dir=(0.7071067811865476, 0, 0.7071067811865475)), mode=Mode.PRIVATE) as cut_extrude_12_sk1:
        with Locations((0, 17.35)):
            Circle(SKETCH_26_R)
    cut_extrude_12_tool1 = extrude(cut_extrude_12_sk1.sketch, amount=-CUT_EXTRUDE_12_REACH, mode=Mode.PRIVATE) & part.part
    add(cut_extrude_12_tool1.solids().sort_by_distance((14.372193, 17.35, 14.372193))[0], mode=Mode.SUBTRACT)

    # Эскиз27 → Повернуть2 (revolve)
    with BuildSketch(Plane(origin=(0, 0, 0), x_dir=(0.7071067811865477, 0, 0.7071067811865475), z_dir=(-0.7071067811865475, 0, 0.7071067811865477)), mode=Mode.PRIVATE) as revolve_2_sk:
        with Locations((18.85, 38)):
            Rectangle(SKETCH_27_W, SKETCH_27_H)
    revolve(revolve_2_sk.sketch.rotate(Axis((0, 12.5, 0), (0, 1, 0)), 135), axis=Axis((0, 12.5, 0), (0, 1, 0)))


solid = part.part
